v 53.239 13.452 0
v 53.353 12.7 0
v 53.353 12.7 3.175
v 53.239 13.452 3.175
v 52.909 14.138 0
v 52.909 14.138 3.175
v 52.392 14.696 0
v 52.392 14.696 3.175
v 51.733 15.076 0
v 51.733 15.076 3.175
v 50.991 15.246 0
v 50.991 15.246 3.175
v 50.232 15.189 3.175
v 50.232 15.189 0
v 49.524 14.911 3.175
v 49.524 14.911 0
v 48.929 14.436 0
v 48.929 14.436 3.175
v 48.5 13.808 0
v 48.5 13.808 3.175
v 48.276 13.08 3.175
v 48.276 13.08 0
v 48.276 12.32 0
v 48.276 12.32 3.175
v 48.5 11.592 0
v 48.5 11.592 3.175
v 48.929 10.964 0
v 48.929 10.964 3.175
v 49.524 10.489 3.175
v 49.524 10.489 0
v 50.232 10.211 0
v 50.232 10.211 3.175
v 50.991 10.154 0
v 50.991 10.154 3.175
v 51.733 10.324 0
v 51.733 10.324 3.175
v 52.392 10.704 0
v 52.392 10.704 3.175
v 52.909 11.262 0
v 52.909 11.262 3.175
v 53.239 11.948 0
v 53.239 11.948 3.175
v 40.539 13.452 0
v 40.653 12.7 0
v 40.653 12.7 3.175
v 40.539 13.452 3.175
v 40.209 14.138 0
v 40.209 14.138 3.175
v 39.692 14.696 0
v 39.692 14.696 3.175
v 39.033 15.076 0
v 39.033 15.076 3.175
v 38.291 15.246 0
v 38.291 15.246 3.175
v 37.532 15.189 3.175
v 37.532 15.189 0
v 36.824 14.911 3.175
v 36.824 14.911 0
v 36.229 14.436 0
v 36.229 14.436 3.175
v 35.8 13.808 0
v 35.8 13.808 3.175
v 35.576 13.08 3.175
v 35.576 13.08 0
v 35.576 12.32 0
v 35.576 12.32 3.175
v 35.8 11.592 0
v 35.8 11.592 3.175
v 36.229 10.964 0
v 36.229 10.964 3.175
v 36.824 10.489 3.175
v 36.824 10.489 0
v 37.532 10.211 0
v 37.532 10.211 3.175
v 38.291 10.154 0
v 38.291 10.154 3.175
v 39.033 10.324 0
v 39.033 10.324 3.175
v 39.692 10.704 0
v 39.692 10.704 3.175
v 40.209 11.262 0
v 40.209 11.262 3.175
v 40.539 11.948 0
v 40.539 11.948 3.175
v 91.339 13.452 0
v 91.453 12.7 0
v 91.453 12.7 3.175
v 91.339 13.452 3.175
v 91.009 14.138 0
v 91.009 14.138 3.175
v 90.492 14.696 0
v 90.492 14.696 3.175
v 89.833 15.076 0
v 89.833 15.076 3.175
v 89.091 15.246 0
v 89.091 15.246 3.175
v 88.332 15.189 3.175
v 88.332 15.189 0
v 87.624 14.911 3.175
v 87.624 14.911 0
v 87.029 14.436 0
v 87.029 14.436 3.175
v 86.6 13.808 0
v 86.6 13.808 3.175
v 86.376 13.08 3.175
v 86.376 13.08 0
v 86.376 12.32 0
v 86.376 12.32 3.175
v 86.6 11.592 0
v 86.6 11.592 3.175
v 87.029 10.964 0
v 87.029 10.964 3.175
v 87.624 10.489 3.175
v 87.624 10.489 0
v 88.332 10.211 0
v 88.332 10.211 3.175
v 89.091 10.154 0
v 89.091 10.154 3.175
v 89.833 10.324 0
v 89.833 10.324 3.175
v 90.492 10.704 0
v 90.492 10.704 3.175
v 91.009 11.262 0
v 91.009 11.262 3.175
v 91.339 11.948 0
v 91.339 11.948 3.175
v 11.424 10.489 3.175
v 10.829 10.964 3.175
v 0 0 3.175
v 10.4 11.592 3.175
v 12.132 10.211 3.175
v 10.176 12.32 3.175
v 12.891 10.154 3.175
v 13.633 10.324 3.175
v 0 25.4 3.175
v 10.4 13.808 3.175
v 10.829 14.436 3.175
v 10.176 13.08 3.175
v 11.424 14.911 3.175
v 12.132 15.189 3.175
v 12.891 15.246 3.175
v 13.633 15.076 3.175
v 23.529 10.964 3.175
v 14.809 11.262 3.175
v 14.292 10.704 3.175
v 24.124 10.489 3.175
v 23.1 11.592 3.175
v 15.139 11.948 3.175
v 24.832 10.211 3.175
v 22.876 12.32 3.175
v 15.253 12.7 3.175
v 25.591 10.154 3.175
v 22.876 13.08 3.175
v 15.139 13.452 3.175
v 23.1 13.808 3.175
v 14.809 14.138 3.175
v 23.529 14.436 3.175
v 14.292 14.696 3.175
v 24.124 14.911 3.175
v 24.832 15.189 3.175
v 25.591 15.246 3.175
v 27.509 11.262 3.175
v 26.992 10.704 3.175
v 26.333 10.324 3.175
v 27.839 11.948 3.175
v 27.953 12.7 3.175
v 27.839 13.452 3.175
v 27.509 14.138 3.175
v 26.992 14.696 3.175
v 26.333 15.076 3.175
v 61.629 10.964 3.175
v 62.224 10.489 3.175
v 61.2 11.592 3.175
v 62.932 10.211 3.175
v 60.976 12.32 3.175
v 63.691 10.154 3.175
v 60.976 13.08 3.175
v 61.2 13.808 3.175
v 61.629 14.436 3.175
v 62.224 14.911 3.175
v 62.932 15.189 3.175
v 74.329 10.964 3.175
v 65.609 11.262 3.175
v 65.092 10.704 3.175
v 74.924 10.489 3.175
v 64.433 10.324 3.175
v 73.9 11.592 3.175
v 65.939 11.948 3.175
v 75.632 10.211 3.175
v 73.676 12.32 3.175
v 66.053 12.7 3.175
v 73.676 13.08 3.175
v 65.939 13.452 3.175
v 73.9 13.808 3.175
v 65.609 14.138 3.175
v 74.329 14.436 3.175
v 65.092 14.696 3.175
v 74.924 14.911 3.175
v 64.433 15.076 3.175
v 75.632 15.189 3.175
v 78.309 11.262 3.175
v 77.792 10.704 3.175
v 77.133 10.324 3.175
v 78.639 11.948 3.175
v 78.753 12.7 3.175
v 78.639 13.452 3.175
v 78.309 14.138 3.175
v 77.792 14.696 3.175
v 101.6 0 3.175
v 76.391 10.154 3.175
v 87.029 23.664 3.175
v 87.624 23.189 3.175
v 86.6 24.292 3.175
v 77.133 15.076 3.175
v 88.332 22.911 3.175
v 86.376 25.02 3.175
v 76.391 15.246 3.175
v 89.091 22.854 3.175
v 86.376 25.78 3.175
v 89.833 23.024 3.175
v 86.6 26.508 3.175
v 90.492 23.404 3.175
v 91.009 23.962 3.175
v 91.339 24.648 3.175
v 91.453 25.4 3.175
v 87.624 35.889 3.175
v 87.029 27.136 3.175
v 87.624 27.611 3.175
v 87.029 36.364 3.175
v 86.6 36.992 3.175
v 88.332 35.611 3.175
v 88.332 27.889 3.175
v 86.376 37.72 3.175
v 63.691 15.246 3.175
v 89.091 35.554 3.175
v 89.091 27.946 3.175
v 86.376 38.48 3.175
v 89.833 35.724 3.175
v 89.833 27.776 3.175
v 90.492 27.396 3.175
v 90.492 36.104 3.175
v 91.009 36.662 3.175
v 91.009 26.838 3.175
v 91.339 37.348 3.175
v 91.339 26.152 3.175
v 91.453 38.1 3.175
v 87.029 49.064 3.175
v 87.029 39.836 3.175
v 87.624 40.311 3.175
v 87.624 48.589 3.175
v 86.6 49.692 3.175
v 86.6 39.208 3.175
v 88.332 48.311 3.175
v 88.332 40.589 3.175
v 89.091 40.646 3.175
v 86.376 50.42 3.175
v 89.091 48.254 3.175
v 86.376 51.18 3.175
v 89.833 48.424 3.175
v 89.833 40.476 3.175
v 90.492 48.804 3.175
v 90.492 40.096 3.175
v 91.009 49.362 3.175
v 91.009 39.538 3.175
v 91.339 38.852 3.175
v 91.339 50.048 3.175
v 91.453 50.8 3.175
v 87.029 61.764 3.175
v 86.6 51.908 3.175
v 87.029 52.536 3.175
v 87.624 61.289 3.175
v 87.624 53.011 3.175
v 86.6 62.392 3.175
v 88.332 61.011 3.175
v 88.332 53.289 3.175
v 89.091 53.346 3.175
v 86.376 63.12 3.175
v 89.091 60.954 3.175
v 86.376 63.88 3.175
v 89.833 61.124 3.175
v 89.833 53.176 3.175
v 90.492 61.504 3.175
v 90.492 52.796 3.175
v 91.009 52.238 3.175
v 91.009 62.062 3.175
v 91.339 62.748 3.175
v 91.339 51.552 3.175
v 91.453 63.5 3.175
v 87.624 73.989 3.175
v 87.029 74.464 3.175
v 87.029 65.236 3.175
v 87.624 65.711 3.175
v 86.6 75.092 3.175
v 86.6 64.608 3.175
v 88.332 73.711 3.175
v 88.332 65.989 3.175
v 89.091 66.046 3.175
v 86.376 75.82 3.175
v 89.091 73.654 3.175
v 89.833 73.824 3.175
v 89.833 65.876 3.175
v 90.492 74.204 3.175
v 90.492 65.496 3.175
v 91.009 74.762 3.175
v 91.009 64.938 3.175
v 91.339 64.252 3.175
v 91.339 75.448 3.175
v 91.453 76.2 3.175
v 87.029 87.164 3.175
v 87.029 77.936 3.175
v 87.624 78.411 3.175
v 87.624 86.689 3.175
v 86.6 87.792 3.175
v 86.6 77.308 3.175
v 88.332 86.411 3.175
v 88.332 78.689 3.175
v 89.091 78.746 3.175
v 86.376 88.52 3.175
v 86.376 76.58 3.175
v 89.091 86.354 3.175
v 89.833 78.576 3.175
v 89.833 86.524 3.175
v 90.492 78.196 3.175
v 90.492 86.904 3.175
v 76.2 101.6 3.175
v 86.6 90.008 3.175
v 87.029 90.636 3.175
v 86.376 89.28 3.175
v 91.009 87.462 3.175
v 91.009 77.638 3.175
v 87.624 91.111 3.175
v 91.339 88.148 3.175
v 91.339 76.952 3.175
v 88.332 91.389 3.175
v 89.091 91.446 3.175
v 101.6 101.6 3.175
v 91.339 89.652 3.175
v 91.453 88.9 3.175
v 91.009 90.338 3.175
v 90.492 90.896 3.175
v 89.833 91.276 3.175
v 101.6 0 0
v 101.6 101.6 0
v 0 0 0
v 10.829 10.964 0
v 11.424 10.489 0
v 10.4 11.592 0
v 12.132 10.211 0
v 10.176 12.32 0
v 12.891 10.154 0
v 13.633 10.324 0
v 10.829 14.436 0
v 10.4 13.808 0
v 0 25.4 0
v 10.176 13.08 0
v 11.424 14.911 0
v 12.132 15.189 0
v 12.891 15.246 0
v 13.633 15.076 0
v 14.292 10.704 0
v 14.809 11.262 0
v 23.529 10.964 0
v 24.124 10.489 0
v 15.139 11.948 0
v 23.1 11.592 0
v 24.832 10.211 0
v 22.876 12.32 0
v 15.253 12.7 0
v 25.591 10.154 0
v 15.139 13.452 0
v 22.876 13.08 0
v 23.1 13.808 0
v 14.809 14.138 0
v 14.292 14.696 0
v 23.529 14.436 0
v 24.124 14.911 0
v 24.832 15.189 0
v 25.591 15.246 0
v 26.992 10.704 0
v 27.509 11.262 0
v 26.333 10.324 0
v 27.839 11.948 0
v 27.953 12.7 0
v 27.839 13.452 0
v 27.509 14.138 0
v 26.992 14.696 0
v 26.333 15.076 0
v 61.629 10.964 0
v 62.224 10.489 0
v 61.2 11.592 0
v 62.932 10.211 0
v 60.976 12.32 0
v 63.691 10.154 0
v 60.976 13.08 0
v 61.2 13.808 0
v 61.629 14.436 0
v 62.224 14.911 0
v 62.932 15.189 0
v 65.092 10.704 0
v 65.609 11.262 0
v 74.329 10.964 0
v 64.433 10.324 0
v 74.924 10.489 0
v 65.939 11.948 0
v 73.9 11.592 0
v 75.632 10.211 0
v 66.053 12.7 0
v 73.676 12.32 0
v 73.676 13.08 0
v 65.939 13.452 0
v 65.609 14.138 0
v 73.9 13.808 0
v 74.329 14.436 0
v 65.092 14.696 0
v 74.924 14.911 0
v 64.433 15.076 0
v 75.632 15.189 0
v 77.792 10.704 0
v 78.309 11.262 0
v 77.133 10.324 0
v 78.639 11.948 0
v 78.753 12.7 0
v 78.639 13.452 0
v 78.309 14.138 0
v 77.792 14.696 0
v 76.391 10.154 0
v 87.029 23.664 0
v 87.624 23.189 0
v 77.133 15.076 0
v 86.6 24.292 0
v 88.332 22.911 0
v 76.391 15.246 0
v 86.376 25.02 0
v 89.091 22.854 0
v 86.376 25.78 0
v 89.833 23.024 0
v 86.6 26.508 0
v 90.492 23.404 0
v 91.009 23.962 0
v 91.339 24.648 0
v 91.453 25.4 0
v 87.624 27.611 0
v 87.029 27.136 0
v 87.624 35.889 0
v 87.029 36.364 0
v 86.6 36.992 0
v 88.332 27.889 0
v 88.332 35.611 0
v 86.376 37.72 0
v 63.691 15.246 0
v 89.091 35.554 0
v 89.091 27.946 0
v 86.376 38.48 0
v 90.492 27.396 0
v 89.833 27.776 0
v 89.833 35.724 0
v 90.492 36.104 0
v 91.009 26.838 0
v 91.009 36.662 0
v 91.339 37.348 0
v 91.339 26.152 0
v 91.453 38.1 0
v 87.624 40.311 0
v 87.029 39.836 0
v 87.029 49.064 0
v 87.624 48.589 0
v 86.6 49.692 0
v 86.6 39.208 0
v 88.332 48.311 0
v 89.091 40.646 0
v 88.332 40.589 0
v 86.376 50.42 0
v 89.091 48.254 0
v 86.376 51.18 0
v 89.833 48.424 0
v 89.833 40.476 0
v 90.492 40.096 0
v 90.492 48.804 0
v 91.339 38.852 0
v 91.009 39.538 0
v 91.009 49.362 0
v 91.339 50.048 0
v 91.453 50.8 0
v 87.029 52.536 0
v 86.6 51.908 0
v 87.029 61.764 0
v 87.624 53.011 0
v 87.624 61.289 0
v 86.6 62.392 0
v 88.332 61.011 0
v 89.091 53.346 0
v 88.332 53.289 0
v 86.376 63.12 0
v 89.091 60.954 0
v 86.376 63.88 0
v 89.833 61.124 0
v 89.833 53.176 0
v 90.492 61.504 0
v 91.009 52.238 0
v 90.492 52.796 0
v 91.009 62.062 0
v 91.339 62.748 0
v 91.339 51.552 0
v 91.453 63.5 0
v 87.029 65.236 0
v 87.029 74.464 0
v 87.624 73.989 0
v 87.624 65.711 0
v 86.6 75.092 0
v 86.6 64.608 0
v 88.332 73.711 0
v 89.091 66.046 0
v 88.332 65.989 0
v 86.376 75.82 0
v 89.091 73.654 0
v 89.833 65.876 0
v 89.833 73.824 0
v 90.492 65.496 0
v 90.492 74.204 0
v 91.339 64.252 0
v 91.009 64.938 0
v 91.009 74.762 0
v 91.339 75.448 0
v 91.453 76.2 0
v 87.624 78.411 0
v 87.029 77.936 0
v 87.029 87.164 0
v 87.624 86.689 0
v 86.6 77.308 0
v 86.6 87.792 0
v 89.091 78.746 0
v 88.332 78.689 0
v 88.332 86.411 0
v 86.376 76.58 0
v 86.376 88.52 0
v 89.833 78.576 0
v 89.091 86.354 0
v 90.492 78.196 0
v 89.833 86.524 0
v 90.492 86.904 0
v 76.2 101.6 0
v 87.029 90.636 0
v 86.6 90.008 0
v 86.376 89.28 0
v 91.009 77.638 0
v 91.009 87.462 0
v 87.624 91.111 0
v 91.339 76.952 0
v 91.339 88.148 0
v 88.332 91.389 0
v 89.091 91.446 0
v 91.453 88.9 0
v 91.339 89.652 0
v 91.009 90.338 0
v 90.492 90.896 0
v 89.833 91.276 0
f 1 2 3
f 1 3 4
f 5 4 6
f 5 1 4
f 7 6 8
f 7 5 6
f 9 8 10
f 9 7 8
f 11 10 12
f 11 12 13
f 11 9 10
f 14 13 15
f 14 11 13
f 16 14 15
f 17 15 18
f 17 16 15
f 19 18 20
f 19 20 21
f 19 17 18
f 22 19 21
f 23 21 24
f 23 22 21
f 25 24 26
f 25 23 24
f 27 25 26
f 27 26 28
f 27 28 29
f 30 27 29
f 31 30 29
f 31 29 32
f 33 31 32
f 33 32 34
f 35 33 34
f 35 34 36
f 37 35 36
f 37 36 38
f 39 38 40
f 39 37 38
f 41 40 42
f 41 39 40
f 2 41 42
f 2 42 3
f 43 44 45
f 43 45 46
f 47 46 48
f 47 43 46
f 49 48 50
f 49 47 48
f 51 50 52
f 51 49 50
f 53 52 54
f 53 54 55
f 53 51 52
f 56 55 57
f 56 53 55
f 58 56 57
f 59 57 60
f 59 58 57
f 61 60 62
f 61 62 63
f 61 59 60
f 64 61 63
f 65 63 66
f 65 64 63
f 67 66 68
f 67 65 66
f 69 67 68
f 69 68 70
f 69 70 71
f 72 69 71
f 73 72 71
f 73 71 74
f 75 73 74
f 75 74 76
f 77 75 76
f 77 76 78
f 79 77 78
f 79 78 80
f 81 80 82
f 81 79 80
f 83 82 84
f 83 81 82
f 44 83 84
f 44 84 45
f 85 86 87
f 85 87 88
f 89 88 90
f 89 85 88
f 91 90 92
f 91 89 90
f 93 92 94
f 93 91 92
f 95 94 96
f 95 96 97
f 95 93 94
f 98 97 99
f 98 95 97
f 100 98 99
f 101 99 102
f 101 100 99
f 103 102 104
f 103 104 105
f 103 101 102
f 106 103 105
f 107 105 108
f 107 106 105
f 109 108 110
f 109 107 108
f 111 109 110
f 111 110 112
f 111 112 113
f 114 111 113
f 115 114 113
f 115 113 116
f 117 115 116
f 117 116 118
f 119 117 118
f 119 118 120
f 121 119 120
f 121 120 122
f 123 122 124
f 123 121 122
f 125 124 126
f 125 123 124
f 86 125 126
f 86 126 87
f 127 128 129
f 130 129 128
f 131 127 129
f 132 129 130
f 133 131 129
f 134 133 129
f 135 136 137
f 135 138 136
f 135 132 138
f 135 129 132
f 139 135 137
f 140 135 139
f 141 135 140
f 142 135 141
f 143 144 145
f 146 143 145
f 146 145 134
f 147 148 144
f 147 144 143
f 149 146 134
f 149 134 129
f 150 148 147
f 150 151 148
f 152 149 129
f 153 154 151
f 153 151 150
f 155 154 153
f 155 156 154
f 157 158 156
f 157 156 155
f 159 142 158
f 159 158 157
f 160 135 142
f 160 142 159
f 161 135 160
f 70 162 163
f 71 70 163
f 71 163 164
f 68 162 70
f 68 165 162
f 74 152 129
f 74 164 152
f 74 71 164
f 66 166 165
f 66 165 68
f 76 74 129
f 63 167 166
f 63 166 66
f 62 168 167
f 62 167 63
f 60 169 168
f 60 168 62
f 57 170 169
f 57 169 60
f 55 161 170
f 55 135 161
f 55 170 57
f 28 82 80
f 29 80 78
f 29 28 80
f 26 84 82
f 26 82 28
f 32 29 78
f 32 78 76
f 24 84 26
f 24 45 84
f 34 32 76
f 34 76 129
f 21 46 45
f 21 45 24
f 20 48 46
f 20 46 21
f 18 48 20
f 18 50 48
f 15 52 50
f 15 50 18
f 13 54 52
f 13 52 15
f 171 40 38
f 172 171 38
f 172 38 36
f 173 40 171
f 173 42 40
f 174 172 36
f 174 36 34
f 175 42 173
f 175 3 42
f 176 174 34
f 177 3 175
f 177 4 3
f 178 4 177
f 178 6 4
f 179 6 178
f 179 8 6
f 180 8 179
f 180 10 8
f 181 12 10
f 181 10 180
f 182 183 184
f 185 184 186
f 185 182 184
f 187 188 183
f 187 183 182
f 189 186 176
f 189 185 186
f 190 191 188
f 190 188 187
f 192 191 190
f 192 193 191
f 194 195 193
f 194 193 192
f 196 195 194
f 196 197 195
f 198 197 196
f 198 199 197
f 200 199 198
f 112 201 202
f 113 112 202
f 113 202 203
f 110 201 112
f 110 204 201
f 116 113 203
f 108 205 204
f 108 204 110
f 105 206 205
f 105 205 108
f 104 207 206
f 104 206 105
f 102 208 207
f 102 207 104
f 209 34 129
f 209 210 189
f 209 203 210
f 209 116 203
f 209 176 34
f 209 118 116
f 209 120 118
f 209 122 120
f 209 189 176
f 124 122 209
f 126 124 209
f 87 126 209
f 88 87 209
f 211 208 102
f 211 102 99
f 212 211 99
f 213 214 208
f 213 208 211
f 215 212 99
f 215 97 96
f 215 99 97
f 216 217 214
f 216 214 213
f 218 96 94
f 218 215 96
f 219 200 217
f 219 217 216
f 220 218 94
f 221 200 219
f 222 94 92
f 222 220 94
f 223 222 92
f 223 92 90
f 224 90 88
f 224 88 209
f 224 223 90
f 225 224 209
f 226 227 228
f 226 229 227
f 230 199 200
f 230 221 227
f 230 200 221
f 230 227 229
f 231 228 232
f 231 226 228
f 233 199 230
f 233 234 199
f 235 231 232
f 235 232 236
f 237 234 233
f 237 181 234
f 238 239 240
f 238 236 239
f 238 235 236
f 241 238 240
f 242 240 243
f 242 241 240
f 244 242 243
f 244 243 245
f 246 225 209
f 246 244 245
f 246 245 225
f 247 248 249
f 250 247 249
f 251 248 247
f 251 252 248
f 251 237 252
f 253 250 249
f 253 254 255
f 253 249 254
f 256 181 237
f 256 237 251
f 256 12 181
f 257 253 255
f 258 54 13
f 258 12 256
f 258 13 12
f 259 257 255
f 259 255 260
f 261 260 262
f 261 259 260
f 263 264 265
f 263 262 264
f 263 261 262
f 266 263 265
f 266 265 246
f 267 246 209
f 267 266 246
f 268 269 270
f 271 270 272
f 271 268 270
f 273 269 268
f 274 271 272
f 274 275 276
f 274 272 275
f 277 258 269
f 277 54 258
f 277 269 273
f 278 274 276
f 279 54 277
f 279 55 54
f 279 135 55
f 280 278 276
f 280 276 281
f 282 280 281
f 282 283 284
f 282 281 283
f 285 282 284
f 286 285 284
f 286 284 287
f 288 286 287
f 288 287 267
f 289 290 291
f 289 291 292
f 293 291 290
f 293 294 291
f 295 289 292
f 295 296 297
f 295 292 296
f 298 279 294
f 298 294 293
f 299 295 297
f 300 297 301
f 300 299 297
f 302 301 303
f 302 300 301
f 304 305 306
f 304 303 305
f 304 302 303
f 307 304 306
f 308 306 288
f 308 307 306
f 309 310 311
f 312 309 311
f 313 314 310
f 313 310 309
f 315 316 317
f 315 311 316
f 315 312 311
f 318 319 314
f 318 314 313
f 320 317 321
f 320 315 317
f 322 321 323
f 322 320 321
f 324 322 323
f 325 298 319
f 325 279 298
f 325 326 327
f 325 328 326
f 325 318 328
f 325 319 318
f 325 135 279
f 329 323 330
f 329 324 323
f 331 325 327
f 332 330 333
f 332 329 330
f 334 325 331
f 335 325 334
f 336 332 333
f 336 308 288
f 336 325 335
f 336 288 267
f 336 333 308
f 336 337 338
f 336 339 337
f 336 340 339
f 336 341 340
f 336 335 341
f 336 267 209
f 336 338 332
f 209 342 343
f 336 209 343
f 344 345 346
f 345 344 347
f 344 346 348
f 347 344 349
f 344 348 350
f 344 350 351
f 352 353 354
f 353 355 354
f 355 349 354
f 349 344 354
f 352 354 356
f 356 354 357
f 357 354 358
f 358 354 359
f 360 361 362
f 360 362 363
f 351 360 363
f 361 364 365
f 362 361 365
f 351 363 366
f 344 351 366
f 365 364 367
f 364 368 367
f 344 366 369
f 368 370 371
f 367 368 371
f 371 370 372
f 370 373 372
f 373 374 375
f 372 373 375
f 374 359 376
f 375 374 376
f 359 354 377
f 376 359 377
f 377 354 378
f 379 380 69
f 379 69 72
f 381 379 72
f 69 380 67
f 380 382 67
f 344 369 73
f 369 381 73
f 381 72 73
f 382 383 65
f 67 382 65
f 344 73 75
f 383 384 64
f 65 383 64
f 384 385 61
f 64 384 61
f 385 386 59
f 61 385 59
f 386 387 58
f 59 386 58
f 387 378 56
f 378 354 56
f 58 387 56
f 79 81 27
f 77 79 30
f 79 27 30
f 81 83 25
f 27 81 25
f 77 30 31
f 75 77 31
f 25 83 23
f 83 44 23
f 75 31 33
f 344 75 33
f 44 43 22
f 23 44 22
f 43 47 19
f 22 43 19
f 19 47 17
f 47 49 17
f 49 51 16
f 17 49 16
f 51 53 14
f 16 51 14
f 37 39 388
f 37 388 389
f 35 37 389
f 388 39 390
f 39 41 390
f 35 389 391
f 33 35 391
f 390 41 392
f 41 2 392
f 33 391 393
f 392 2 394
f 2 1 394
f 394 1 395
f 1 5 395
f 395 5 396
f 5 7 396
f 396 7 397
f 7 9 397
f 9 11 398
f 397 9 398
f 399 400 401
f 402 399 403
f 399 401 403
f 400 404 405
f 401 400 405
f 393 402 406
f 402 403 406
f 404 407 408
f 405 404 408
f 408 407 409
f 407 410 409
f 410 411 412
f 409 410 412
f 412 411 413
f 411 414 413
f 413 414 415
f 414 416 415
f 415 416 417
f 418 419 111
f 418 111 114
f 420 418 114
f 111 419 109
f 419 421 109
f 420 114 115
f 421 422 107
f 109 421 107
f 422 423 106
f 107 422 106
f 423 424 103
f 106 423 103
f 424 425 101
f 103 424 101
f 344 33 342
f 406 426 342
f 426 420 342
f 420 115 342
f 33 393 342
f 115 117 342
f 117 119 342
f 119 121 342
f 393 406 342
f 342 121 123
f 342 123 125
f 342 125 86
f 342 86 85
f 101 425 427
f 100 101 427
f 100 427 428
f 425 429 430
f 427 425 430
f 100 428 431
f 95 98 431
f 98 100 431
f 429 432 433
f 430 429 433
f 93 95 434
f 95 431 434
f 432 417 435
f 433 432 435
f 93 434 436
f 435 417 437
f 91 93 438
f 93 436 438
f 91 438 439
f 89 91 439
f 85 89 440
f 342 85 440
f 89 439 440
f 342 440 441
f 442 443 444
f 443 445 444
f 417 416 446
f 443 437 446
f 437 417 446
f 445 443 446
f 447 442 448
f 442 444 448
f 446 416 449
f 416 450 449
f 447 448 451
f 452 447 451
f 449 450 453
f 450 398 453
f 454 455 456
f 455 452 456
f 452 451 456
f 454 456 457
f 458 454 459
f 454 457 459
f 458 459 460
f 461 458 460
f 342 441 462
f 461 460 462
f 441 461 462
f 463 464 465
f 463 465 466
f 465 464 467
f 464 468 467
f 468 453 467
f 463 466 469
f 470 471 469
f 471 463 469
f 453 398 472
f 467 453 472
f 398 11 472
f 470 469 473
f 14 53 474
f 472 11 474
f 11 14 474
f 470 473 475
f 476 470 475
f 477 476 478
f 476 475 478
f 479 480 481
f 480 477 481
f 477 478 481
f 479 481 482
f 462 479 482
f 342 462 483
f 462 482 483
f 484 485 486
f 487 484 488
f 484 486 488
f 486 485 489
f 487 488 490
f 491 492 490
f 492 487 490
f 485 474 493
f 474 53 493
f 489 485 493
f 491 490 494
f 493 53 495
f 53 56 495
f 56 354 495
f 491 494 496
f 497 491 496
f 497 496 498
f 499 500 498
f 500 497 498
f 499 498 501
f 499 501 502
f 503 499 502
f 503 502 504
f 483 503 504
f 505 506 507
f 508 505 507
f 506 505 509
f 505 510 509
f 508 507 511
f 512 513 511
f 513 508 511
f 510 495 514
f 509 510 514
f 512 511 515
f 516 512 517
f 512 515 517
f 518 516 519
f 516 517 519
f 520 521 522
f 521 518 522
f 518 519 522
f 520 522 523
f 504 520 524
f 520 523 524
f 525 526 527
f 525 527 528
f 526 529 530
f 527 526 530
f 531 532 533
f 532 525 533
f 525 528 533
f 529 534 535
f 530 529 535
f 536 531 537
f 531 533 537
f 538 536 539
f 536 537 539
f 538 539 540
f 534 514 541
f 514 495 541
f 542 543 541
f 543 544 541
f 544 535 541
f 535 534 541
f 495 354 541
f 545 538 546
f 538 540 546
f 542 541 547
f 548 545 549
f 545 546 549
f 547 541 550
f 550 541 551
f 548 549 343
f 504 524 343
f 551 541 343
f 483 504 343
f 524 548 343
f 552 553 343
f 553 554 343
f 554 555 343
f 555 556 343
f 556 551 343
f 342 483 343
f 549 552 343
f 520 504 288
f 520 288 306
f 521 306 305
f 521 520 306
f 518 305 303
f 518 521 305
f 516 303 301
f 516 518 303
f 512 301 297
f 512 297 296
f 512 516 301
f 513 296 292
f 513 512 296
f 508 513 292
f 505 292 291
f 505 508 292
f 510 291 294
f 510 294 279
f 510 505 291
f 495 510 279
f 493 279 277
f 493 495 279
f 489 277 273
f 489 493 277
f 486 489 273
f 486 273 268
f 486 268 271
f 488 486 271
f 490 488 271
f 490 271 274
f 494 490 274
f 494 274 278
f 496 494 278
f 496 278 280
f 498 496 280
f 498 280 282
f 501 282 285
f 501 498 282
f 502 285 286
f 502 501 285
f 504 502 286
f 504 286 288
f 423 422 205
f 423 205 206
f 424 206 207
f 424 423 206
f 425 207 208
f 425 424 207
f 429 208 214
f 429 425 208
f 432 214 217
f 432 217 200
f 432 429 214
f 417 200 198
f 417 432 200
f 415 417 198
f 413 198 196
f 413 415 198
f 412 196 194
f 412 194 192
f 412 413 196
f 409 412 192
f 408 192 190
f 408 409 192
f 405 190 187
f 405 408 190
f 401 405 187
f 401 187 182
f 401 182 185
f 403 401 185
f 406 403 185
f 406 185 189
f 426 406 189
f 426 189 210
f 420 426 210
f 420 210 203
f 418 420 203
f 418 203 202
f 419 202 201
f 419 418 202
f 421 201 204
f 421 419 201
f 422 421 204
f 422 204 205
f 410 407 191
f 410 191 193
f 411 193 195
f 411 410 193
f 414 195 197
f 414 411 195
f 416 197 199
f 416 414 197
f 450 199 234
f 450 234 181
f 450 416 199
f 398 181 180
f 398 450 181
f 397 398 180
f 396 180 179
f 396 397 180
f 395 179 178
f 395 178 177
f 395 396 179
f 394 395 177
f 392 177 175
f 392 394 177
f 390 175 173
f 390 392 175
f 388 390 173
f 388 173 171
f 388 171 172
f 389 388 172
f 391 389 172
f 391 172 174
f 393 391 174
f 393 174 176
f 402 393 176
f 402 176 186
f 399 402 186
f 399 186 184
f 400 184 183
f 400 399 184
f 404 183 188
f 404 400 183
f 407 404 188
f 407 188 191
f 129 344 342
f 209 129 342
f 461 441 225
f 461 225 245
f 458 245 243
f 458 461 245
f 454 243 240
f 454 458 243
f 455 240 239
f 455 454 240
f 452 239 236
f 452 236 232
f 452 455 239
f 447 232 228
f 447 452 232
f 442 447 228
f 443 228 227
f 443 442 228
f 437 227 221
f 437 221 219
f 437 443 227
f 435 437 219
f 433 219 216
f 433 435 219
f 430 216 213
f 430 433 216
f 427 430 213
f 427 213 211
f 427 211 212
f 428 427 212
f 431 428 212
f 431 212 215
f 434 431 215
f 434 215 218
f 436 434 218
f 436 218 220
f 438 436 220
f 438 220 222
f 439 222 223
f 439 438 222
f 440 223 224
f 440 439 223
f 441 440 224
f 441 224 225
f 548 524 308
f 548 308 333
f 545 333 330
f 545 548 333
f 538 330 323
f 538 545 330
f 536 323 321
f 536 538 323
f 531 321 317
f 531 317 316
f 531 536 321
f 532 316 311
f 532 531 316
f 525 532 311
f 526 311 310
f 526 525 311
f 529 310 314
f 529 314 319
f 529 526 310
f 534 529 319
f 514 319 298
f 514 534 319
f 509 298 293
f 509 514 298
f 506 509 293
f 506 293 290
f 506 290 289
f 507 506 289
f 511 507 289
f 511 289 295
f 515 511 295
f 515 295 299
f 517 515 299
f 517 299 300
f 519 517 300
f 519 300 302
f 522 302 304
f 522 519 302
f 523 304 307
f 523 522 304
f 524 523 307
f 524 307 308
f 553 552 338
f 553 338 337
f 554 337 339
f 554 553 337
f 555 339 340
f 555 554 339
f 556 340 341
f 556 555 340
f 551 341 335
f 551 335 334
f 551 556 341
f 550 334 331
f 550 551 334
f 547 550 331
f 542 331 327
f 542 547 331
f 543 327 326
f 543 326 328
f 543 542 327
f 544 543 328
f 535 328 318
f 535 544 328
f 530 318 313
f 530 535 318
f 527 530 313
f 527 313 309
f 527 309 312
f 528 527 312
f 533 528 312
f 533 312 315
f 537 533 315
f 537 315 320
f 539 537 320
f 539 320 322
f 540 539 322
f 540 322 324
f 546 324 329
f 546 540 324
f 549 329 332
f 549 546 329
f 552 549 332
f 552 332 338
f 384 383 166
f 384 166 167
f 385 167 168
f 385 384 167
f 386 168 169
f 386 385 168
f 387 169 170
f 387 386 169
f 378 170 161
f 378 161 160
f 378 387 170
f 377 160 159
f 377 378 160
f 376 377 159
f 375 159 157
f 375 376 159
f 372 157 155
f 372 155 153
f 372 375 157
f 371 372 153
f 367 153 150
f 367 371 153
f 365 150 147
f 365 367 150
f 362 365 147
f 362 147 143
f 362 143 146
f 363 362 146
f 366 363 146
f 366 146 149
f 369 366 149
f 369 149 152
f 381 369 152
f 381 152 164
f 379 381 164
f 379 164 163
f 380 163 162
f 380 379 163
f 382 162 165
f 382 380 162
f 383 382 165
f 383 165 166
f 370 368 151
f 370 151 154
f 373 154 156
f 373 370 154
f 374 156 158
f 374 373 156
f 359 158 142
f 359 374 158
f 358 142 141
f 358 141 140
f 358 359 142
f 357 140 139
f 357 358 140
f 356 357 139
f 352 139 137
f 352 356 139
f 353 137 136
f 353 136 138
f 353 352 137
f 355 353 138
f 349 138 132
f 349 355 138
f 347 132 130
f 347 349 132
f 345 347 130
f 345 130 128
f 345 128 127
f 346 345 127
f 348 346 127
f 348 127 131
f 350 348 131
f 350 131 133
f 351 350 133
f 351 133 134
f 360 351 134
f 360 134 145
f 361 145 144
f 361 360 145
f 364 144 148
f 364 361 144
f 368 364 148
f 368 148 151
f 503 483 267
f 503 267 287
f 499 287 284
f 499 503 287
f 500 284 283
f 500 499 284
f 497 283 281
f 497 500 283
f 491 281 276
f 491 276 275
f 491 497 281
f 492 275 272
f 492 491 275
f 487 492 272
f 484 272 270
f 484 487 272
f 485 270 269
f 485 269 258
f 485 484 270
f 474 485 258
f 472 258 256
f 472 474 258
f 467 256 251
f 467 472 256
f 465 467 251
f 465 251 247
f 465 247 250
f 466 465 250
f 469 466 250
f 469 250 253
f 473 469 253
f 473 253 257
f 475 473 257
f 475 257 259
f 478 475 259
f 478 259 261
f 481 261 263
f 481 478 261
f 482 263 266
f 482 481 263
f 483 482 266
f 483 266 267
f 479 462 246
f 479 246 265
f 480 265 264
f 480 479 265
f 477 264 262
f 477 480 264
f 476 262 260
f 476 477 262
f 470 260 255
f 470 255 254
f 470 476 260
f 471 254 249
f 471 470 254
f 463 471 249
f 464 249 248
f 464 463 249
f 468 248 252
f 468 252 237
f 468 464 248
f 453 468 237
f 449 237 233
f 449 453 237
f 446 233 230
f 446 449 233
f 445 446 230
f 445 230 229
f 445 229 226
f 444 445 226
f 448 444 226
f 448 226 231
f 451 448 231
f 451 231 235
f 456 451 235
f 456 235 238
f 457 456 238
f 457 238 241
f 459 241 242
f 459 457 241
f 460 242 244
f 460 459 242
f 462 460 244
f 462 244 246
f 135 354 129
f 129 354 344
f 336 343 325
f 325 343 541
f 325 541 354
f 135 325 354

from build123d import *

# Parameters (mm, degrees)
F0_R     = 2.5527
F1_DEPTH = 3.175


# Not quite as in the source:
# - a length typed as a fraction of an inch, garbled in the dataset ("3 / 203.2 mm" for 3/8 in), is restored


with BuildPart() as f1:
    # F0 (on Top) → F1 (new body)
    with BuildSketch(Plane.XY):
        Polygon((0, 25.4), (0, 0), (101.6, 0), (101.6, 101.6), (76.2, 101.6), (76.2, 25.4), align=None)
        with Locations((12.7, 12.7)):
            Circle(F0_R, mode=Mode.SUBTRACT)
        with Locations((25.4, 12.7)):
            Circle(F0_R, mode=Mode.SUBTRACT)
        with Locations((38.1, 12.7)):
            Circle(F0_R, mode=Mode.SUBTRACT)
        with Locations((50.8, 12.7)):
            Circle(F0_R, mode=Mode.SUBTRACT)
        with Locations((63.5, 12.7)):
            Circle(F0_R, mode=Mode.SUBTRACT)
        with Locations((76.2, 12.7)):
            Circle(F0_R, mode=Mode.SUBTRACT)
        with Locations((88.9, 12.7)):
            Circle(F0_R, mode=Mode.SUBTRACT)
        with Locations((88.9, 25.4)):
            Circle(F0_R, mode=Mode.SUBTRACT)
        with Locations((88.9, 38.1)):
            Circle(F0_R, mode=Mode.SUBTRACT)
        with Locations((88.9, 50.8)):
            Circle(F0_R, mode=Mode.SUBTRACT)
        with Locations((88.9, 63.5)):
            Circle(F0_R, mode=Mode.SUBTRACT)
        with Locations((88.9, 76.2)):
            Circle(F0_R, mode=Mode.SUBTRACT)
        with Locations((88.9, 88.9)):
            Circle(F0_R, mode=Mode.SUBTRACT)
        Polygon((76.2, 101.6), (0, 25.4), (76.2, 25.4), align=None)
    extrude(amount=F1_DEPTH)


solid = f1.part
